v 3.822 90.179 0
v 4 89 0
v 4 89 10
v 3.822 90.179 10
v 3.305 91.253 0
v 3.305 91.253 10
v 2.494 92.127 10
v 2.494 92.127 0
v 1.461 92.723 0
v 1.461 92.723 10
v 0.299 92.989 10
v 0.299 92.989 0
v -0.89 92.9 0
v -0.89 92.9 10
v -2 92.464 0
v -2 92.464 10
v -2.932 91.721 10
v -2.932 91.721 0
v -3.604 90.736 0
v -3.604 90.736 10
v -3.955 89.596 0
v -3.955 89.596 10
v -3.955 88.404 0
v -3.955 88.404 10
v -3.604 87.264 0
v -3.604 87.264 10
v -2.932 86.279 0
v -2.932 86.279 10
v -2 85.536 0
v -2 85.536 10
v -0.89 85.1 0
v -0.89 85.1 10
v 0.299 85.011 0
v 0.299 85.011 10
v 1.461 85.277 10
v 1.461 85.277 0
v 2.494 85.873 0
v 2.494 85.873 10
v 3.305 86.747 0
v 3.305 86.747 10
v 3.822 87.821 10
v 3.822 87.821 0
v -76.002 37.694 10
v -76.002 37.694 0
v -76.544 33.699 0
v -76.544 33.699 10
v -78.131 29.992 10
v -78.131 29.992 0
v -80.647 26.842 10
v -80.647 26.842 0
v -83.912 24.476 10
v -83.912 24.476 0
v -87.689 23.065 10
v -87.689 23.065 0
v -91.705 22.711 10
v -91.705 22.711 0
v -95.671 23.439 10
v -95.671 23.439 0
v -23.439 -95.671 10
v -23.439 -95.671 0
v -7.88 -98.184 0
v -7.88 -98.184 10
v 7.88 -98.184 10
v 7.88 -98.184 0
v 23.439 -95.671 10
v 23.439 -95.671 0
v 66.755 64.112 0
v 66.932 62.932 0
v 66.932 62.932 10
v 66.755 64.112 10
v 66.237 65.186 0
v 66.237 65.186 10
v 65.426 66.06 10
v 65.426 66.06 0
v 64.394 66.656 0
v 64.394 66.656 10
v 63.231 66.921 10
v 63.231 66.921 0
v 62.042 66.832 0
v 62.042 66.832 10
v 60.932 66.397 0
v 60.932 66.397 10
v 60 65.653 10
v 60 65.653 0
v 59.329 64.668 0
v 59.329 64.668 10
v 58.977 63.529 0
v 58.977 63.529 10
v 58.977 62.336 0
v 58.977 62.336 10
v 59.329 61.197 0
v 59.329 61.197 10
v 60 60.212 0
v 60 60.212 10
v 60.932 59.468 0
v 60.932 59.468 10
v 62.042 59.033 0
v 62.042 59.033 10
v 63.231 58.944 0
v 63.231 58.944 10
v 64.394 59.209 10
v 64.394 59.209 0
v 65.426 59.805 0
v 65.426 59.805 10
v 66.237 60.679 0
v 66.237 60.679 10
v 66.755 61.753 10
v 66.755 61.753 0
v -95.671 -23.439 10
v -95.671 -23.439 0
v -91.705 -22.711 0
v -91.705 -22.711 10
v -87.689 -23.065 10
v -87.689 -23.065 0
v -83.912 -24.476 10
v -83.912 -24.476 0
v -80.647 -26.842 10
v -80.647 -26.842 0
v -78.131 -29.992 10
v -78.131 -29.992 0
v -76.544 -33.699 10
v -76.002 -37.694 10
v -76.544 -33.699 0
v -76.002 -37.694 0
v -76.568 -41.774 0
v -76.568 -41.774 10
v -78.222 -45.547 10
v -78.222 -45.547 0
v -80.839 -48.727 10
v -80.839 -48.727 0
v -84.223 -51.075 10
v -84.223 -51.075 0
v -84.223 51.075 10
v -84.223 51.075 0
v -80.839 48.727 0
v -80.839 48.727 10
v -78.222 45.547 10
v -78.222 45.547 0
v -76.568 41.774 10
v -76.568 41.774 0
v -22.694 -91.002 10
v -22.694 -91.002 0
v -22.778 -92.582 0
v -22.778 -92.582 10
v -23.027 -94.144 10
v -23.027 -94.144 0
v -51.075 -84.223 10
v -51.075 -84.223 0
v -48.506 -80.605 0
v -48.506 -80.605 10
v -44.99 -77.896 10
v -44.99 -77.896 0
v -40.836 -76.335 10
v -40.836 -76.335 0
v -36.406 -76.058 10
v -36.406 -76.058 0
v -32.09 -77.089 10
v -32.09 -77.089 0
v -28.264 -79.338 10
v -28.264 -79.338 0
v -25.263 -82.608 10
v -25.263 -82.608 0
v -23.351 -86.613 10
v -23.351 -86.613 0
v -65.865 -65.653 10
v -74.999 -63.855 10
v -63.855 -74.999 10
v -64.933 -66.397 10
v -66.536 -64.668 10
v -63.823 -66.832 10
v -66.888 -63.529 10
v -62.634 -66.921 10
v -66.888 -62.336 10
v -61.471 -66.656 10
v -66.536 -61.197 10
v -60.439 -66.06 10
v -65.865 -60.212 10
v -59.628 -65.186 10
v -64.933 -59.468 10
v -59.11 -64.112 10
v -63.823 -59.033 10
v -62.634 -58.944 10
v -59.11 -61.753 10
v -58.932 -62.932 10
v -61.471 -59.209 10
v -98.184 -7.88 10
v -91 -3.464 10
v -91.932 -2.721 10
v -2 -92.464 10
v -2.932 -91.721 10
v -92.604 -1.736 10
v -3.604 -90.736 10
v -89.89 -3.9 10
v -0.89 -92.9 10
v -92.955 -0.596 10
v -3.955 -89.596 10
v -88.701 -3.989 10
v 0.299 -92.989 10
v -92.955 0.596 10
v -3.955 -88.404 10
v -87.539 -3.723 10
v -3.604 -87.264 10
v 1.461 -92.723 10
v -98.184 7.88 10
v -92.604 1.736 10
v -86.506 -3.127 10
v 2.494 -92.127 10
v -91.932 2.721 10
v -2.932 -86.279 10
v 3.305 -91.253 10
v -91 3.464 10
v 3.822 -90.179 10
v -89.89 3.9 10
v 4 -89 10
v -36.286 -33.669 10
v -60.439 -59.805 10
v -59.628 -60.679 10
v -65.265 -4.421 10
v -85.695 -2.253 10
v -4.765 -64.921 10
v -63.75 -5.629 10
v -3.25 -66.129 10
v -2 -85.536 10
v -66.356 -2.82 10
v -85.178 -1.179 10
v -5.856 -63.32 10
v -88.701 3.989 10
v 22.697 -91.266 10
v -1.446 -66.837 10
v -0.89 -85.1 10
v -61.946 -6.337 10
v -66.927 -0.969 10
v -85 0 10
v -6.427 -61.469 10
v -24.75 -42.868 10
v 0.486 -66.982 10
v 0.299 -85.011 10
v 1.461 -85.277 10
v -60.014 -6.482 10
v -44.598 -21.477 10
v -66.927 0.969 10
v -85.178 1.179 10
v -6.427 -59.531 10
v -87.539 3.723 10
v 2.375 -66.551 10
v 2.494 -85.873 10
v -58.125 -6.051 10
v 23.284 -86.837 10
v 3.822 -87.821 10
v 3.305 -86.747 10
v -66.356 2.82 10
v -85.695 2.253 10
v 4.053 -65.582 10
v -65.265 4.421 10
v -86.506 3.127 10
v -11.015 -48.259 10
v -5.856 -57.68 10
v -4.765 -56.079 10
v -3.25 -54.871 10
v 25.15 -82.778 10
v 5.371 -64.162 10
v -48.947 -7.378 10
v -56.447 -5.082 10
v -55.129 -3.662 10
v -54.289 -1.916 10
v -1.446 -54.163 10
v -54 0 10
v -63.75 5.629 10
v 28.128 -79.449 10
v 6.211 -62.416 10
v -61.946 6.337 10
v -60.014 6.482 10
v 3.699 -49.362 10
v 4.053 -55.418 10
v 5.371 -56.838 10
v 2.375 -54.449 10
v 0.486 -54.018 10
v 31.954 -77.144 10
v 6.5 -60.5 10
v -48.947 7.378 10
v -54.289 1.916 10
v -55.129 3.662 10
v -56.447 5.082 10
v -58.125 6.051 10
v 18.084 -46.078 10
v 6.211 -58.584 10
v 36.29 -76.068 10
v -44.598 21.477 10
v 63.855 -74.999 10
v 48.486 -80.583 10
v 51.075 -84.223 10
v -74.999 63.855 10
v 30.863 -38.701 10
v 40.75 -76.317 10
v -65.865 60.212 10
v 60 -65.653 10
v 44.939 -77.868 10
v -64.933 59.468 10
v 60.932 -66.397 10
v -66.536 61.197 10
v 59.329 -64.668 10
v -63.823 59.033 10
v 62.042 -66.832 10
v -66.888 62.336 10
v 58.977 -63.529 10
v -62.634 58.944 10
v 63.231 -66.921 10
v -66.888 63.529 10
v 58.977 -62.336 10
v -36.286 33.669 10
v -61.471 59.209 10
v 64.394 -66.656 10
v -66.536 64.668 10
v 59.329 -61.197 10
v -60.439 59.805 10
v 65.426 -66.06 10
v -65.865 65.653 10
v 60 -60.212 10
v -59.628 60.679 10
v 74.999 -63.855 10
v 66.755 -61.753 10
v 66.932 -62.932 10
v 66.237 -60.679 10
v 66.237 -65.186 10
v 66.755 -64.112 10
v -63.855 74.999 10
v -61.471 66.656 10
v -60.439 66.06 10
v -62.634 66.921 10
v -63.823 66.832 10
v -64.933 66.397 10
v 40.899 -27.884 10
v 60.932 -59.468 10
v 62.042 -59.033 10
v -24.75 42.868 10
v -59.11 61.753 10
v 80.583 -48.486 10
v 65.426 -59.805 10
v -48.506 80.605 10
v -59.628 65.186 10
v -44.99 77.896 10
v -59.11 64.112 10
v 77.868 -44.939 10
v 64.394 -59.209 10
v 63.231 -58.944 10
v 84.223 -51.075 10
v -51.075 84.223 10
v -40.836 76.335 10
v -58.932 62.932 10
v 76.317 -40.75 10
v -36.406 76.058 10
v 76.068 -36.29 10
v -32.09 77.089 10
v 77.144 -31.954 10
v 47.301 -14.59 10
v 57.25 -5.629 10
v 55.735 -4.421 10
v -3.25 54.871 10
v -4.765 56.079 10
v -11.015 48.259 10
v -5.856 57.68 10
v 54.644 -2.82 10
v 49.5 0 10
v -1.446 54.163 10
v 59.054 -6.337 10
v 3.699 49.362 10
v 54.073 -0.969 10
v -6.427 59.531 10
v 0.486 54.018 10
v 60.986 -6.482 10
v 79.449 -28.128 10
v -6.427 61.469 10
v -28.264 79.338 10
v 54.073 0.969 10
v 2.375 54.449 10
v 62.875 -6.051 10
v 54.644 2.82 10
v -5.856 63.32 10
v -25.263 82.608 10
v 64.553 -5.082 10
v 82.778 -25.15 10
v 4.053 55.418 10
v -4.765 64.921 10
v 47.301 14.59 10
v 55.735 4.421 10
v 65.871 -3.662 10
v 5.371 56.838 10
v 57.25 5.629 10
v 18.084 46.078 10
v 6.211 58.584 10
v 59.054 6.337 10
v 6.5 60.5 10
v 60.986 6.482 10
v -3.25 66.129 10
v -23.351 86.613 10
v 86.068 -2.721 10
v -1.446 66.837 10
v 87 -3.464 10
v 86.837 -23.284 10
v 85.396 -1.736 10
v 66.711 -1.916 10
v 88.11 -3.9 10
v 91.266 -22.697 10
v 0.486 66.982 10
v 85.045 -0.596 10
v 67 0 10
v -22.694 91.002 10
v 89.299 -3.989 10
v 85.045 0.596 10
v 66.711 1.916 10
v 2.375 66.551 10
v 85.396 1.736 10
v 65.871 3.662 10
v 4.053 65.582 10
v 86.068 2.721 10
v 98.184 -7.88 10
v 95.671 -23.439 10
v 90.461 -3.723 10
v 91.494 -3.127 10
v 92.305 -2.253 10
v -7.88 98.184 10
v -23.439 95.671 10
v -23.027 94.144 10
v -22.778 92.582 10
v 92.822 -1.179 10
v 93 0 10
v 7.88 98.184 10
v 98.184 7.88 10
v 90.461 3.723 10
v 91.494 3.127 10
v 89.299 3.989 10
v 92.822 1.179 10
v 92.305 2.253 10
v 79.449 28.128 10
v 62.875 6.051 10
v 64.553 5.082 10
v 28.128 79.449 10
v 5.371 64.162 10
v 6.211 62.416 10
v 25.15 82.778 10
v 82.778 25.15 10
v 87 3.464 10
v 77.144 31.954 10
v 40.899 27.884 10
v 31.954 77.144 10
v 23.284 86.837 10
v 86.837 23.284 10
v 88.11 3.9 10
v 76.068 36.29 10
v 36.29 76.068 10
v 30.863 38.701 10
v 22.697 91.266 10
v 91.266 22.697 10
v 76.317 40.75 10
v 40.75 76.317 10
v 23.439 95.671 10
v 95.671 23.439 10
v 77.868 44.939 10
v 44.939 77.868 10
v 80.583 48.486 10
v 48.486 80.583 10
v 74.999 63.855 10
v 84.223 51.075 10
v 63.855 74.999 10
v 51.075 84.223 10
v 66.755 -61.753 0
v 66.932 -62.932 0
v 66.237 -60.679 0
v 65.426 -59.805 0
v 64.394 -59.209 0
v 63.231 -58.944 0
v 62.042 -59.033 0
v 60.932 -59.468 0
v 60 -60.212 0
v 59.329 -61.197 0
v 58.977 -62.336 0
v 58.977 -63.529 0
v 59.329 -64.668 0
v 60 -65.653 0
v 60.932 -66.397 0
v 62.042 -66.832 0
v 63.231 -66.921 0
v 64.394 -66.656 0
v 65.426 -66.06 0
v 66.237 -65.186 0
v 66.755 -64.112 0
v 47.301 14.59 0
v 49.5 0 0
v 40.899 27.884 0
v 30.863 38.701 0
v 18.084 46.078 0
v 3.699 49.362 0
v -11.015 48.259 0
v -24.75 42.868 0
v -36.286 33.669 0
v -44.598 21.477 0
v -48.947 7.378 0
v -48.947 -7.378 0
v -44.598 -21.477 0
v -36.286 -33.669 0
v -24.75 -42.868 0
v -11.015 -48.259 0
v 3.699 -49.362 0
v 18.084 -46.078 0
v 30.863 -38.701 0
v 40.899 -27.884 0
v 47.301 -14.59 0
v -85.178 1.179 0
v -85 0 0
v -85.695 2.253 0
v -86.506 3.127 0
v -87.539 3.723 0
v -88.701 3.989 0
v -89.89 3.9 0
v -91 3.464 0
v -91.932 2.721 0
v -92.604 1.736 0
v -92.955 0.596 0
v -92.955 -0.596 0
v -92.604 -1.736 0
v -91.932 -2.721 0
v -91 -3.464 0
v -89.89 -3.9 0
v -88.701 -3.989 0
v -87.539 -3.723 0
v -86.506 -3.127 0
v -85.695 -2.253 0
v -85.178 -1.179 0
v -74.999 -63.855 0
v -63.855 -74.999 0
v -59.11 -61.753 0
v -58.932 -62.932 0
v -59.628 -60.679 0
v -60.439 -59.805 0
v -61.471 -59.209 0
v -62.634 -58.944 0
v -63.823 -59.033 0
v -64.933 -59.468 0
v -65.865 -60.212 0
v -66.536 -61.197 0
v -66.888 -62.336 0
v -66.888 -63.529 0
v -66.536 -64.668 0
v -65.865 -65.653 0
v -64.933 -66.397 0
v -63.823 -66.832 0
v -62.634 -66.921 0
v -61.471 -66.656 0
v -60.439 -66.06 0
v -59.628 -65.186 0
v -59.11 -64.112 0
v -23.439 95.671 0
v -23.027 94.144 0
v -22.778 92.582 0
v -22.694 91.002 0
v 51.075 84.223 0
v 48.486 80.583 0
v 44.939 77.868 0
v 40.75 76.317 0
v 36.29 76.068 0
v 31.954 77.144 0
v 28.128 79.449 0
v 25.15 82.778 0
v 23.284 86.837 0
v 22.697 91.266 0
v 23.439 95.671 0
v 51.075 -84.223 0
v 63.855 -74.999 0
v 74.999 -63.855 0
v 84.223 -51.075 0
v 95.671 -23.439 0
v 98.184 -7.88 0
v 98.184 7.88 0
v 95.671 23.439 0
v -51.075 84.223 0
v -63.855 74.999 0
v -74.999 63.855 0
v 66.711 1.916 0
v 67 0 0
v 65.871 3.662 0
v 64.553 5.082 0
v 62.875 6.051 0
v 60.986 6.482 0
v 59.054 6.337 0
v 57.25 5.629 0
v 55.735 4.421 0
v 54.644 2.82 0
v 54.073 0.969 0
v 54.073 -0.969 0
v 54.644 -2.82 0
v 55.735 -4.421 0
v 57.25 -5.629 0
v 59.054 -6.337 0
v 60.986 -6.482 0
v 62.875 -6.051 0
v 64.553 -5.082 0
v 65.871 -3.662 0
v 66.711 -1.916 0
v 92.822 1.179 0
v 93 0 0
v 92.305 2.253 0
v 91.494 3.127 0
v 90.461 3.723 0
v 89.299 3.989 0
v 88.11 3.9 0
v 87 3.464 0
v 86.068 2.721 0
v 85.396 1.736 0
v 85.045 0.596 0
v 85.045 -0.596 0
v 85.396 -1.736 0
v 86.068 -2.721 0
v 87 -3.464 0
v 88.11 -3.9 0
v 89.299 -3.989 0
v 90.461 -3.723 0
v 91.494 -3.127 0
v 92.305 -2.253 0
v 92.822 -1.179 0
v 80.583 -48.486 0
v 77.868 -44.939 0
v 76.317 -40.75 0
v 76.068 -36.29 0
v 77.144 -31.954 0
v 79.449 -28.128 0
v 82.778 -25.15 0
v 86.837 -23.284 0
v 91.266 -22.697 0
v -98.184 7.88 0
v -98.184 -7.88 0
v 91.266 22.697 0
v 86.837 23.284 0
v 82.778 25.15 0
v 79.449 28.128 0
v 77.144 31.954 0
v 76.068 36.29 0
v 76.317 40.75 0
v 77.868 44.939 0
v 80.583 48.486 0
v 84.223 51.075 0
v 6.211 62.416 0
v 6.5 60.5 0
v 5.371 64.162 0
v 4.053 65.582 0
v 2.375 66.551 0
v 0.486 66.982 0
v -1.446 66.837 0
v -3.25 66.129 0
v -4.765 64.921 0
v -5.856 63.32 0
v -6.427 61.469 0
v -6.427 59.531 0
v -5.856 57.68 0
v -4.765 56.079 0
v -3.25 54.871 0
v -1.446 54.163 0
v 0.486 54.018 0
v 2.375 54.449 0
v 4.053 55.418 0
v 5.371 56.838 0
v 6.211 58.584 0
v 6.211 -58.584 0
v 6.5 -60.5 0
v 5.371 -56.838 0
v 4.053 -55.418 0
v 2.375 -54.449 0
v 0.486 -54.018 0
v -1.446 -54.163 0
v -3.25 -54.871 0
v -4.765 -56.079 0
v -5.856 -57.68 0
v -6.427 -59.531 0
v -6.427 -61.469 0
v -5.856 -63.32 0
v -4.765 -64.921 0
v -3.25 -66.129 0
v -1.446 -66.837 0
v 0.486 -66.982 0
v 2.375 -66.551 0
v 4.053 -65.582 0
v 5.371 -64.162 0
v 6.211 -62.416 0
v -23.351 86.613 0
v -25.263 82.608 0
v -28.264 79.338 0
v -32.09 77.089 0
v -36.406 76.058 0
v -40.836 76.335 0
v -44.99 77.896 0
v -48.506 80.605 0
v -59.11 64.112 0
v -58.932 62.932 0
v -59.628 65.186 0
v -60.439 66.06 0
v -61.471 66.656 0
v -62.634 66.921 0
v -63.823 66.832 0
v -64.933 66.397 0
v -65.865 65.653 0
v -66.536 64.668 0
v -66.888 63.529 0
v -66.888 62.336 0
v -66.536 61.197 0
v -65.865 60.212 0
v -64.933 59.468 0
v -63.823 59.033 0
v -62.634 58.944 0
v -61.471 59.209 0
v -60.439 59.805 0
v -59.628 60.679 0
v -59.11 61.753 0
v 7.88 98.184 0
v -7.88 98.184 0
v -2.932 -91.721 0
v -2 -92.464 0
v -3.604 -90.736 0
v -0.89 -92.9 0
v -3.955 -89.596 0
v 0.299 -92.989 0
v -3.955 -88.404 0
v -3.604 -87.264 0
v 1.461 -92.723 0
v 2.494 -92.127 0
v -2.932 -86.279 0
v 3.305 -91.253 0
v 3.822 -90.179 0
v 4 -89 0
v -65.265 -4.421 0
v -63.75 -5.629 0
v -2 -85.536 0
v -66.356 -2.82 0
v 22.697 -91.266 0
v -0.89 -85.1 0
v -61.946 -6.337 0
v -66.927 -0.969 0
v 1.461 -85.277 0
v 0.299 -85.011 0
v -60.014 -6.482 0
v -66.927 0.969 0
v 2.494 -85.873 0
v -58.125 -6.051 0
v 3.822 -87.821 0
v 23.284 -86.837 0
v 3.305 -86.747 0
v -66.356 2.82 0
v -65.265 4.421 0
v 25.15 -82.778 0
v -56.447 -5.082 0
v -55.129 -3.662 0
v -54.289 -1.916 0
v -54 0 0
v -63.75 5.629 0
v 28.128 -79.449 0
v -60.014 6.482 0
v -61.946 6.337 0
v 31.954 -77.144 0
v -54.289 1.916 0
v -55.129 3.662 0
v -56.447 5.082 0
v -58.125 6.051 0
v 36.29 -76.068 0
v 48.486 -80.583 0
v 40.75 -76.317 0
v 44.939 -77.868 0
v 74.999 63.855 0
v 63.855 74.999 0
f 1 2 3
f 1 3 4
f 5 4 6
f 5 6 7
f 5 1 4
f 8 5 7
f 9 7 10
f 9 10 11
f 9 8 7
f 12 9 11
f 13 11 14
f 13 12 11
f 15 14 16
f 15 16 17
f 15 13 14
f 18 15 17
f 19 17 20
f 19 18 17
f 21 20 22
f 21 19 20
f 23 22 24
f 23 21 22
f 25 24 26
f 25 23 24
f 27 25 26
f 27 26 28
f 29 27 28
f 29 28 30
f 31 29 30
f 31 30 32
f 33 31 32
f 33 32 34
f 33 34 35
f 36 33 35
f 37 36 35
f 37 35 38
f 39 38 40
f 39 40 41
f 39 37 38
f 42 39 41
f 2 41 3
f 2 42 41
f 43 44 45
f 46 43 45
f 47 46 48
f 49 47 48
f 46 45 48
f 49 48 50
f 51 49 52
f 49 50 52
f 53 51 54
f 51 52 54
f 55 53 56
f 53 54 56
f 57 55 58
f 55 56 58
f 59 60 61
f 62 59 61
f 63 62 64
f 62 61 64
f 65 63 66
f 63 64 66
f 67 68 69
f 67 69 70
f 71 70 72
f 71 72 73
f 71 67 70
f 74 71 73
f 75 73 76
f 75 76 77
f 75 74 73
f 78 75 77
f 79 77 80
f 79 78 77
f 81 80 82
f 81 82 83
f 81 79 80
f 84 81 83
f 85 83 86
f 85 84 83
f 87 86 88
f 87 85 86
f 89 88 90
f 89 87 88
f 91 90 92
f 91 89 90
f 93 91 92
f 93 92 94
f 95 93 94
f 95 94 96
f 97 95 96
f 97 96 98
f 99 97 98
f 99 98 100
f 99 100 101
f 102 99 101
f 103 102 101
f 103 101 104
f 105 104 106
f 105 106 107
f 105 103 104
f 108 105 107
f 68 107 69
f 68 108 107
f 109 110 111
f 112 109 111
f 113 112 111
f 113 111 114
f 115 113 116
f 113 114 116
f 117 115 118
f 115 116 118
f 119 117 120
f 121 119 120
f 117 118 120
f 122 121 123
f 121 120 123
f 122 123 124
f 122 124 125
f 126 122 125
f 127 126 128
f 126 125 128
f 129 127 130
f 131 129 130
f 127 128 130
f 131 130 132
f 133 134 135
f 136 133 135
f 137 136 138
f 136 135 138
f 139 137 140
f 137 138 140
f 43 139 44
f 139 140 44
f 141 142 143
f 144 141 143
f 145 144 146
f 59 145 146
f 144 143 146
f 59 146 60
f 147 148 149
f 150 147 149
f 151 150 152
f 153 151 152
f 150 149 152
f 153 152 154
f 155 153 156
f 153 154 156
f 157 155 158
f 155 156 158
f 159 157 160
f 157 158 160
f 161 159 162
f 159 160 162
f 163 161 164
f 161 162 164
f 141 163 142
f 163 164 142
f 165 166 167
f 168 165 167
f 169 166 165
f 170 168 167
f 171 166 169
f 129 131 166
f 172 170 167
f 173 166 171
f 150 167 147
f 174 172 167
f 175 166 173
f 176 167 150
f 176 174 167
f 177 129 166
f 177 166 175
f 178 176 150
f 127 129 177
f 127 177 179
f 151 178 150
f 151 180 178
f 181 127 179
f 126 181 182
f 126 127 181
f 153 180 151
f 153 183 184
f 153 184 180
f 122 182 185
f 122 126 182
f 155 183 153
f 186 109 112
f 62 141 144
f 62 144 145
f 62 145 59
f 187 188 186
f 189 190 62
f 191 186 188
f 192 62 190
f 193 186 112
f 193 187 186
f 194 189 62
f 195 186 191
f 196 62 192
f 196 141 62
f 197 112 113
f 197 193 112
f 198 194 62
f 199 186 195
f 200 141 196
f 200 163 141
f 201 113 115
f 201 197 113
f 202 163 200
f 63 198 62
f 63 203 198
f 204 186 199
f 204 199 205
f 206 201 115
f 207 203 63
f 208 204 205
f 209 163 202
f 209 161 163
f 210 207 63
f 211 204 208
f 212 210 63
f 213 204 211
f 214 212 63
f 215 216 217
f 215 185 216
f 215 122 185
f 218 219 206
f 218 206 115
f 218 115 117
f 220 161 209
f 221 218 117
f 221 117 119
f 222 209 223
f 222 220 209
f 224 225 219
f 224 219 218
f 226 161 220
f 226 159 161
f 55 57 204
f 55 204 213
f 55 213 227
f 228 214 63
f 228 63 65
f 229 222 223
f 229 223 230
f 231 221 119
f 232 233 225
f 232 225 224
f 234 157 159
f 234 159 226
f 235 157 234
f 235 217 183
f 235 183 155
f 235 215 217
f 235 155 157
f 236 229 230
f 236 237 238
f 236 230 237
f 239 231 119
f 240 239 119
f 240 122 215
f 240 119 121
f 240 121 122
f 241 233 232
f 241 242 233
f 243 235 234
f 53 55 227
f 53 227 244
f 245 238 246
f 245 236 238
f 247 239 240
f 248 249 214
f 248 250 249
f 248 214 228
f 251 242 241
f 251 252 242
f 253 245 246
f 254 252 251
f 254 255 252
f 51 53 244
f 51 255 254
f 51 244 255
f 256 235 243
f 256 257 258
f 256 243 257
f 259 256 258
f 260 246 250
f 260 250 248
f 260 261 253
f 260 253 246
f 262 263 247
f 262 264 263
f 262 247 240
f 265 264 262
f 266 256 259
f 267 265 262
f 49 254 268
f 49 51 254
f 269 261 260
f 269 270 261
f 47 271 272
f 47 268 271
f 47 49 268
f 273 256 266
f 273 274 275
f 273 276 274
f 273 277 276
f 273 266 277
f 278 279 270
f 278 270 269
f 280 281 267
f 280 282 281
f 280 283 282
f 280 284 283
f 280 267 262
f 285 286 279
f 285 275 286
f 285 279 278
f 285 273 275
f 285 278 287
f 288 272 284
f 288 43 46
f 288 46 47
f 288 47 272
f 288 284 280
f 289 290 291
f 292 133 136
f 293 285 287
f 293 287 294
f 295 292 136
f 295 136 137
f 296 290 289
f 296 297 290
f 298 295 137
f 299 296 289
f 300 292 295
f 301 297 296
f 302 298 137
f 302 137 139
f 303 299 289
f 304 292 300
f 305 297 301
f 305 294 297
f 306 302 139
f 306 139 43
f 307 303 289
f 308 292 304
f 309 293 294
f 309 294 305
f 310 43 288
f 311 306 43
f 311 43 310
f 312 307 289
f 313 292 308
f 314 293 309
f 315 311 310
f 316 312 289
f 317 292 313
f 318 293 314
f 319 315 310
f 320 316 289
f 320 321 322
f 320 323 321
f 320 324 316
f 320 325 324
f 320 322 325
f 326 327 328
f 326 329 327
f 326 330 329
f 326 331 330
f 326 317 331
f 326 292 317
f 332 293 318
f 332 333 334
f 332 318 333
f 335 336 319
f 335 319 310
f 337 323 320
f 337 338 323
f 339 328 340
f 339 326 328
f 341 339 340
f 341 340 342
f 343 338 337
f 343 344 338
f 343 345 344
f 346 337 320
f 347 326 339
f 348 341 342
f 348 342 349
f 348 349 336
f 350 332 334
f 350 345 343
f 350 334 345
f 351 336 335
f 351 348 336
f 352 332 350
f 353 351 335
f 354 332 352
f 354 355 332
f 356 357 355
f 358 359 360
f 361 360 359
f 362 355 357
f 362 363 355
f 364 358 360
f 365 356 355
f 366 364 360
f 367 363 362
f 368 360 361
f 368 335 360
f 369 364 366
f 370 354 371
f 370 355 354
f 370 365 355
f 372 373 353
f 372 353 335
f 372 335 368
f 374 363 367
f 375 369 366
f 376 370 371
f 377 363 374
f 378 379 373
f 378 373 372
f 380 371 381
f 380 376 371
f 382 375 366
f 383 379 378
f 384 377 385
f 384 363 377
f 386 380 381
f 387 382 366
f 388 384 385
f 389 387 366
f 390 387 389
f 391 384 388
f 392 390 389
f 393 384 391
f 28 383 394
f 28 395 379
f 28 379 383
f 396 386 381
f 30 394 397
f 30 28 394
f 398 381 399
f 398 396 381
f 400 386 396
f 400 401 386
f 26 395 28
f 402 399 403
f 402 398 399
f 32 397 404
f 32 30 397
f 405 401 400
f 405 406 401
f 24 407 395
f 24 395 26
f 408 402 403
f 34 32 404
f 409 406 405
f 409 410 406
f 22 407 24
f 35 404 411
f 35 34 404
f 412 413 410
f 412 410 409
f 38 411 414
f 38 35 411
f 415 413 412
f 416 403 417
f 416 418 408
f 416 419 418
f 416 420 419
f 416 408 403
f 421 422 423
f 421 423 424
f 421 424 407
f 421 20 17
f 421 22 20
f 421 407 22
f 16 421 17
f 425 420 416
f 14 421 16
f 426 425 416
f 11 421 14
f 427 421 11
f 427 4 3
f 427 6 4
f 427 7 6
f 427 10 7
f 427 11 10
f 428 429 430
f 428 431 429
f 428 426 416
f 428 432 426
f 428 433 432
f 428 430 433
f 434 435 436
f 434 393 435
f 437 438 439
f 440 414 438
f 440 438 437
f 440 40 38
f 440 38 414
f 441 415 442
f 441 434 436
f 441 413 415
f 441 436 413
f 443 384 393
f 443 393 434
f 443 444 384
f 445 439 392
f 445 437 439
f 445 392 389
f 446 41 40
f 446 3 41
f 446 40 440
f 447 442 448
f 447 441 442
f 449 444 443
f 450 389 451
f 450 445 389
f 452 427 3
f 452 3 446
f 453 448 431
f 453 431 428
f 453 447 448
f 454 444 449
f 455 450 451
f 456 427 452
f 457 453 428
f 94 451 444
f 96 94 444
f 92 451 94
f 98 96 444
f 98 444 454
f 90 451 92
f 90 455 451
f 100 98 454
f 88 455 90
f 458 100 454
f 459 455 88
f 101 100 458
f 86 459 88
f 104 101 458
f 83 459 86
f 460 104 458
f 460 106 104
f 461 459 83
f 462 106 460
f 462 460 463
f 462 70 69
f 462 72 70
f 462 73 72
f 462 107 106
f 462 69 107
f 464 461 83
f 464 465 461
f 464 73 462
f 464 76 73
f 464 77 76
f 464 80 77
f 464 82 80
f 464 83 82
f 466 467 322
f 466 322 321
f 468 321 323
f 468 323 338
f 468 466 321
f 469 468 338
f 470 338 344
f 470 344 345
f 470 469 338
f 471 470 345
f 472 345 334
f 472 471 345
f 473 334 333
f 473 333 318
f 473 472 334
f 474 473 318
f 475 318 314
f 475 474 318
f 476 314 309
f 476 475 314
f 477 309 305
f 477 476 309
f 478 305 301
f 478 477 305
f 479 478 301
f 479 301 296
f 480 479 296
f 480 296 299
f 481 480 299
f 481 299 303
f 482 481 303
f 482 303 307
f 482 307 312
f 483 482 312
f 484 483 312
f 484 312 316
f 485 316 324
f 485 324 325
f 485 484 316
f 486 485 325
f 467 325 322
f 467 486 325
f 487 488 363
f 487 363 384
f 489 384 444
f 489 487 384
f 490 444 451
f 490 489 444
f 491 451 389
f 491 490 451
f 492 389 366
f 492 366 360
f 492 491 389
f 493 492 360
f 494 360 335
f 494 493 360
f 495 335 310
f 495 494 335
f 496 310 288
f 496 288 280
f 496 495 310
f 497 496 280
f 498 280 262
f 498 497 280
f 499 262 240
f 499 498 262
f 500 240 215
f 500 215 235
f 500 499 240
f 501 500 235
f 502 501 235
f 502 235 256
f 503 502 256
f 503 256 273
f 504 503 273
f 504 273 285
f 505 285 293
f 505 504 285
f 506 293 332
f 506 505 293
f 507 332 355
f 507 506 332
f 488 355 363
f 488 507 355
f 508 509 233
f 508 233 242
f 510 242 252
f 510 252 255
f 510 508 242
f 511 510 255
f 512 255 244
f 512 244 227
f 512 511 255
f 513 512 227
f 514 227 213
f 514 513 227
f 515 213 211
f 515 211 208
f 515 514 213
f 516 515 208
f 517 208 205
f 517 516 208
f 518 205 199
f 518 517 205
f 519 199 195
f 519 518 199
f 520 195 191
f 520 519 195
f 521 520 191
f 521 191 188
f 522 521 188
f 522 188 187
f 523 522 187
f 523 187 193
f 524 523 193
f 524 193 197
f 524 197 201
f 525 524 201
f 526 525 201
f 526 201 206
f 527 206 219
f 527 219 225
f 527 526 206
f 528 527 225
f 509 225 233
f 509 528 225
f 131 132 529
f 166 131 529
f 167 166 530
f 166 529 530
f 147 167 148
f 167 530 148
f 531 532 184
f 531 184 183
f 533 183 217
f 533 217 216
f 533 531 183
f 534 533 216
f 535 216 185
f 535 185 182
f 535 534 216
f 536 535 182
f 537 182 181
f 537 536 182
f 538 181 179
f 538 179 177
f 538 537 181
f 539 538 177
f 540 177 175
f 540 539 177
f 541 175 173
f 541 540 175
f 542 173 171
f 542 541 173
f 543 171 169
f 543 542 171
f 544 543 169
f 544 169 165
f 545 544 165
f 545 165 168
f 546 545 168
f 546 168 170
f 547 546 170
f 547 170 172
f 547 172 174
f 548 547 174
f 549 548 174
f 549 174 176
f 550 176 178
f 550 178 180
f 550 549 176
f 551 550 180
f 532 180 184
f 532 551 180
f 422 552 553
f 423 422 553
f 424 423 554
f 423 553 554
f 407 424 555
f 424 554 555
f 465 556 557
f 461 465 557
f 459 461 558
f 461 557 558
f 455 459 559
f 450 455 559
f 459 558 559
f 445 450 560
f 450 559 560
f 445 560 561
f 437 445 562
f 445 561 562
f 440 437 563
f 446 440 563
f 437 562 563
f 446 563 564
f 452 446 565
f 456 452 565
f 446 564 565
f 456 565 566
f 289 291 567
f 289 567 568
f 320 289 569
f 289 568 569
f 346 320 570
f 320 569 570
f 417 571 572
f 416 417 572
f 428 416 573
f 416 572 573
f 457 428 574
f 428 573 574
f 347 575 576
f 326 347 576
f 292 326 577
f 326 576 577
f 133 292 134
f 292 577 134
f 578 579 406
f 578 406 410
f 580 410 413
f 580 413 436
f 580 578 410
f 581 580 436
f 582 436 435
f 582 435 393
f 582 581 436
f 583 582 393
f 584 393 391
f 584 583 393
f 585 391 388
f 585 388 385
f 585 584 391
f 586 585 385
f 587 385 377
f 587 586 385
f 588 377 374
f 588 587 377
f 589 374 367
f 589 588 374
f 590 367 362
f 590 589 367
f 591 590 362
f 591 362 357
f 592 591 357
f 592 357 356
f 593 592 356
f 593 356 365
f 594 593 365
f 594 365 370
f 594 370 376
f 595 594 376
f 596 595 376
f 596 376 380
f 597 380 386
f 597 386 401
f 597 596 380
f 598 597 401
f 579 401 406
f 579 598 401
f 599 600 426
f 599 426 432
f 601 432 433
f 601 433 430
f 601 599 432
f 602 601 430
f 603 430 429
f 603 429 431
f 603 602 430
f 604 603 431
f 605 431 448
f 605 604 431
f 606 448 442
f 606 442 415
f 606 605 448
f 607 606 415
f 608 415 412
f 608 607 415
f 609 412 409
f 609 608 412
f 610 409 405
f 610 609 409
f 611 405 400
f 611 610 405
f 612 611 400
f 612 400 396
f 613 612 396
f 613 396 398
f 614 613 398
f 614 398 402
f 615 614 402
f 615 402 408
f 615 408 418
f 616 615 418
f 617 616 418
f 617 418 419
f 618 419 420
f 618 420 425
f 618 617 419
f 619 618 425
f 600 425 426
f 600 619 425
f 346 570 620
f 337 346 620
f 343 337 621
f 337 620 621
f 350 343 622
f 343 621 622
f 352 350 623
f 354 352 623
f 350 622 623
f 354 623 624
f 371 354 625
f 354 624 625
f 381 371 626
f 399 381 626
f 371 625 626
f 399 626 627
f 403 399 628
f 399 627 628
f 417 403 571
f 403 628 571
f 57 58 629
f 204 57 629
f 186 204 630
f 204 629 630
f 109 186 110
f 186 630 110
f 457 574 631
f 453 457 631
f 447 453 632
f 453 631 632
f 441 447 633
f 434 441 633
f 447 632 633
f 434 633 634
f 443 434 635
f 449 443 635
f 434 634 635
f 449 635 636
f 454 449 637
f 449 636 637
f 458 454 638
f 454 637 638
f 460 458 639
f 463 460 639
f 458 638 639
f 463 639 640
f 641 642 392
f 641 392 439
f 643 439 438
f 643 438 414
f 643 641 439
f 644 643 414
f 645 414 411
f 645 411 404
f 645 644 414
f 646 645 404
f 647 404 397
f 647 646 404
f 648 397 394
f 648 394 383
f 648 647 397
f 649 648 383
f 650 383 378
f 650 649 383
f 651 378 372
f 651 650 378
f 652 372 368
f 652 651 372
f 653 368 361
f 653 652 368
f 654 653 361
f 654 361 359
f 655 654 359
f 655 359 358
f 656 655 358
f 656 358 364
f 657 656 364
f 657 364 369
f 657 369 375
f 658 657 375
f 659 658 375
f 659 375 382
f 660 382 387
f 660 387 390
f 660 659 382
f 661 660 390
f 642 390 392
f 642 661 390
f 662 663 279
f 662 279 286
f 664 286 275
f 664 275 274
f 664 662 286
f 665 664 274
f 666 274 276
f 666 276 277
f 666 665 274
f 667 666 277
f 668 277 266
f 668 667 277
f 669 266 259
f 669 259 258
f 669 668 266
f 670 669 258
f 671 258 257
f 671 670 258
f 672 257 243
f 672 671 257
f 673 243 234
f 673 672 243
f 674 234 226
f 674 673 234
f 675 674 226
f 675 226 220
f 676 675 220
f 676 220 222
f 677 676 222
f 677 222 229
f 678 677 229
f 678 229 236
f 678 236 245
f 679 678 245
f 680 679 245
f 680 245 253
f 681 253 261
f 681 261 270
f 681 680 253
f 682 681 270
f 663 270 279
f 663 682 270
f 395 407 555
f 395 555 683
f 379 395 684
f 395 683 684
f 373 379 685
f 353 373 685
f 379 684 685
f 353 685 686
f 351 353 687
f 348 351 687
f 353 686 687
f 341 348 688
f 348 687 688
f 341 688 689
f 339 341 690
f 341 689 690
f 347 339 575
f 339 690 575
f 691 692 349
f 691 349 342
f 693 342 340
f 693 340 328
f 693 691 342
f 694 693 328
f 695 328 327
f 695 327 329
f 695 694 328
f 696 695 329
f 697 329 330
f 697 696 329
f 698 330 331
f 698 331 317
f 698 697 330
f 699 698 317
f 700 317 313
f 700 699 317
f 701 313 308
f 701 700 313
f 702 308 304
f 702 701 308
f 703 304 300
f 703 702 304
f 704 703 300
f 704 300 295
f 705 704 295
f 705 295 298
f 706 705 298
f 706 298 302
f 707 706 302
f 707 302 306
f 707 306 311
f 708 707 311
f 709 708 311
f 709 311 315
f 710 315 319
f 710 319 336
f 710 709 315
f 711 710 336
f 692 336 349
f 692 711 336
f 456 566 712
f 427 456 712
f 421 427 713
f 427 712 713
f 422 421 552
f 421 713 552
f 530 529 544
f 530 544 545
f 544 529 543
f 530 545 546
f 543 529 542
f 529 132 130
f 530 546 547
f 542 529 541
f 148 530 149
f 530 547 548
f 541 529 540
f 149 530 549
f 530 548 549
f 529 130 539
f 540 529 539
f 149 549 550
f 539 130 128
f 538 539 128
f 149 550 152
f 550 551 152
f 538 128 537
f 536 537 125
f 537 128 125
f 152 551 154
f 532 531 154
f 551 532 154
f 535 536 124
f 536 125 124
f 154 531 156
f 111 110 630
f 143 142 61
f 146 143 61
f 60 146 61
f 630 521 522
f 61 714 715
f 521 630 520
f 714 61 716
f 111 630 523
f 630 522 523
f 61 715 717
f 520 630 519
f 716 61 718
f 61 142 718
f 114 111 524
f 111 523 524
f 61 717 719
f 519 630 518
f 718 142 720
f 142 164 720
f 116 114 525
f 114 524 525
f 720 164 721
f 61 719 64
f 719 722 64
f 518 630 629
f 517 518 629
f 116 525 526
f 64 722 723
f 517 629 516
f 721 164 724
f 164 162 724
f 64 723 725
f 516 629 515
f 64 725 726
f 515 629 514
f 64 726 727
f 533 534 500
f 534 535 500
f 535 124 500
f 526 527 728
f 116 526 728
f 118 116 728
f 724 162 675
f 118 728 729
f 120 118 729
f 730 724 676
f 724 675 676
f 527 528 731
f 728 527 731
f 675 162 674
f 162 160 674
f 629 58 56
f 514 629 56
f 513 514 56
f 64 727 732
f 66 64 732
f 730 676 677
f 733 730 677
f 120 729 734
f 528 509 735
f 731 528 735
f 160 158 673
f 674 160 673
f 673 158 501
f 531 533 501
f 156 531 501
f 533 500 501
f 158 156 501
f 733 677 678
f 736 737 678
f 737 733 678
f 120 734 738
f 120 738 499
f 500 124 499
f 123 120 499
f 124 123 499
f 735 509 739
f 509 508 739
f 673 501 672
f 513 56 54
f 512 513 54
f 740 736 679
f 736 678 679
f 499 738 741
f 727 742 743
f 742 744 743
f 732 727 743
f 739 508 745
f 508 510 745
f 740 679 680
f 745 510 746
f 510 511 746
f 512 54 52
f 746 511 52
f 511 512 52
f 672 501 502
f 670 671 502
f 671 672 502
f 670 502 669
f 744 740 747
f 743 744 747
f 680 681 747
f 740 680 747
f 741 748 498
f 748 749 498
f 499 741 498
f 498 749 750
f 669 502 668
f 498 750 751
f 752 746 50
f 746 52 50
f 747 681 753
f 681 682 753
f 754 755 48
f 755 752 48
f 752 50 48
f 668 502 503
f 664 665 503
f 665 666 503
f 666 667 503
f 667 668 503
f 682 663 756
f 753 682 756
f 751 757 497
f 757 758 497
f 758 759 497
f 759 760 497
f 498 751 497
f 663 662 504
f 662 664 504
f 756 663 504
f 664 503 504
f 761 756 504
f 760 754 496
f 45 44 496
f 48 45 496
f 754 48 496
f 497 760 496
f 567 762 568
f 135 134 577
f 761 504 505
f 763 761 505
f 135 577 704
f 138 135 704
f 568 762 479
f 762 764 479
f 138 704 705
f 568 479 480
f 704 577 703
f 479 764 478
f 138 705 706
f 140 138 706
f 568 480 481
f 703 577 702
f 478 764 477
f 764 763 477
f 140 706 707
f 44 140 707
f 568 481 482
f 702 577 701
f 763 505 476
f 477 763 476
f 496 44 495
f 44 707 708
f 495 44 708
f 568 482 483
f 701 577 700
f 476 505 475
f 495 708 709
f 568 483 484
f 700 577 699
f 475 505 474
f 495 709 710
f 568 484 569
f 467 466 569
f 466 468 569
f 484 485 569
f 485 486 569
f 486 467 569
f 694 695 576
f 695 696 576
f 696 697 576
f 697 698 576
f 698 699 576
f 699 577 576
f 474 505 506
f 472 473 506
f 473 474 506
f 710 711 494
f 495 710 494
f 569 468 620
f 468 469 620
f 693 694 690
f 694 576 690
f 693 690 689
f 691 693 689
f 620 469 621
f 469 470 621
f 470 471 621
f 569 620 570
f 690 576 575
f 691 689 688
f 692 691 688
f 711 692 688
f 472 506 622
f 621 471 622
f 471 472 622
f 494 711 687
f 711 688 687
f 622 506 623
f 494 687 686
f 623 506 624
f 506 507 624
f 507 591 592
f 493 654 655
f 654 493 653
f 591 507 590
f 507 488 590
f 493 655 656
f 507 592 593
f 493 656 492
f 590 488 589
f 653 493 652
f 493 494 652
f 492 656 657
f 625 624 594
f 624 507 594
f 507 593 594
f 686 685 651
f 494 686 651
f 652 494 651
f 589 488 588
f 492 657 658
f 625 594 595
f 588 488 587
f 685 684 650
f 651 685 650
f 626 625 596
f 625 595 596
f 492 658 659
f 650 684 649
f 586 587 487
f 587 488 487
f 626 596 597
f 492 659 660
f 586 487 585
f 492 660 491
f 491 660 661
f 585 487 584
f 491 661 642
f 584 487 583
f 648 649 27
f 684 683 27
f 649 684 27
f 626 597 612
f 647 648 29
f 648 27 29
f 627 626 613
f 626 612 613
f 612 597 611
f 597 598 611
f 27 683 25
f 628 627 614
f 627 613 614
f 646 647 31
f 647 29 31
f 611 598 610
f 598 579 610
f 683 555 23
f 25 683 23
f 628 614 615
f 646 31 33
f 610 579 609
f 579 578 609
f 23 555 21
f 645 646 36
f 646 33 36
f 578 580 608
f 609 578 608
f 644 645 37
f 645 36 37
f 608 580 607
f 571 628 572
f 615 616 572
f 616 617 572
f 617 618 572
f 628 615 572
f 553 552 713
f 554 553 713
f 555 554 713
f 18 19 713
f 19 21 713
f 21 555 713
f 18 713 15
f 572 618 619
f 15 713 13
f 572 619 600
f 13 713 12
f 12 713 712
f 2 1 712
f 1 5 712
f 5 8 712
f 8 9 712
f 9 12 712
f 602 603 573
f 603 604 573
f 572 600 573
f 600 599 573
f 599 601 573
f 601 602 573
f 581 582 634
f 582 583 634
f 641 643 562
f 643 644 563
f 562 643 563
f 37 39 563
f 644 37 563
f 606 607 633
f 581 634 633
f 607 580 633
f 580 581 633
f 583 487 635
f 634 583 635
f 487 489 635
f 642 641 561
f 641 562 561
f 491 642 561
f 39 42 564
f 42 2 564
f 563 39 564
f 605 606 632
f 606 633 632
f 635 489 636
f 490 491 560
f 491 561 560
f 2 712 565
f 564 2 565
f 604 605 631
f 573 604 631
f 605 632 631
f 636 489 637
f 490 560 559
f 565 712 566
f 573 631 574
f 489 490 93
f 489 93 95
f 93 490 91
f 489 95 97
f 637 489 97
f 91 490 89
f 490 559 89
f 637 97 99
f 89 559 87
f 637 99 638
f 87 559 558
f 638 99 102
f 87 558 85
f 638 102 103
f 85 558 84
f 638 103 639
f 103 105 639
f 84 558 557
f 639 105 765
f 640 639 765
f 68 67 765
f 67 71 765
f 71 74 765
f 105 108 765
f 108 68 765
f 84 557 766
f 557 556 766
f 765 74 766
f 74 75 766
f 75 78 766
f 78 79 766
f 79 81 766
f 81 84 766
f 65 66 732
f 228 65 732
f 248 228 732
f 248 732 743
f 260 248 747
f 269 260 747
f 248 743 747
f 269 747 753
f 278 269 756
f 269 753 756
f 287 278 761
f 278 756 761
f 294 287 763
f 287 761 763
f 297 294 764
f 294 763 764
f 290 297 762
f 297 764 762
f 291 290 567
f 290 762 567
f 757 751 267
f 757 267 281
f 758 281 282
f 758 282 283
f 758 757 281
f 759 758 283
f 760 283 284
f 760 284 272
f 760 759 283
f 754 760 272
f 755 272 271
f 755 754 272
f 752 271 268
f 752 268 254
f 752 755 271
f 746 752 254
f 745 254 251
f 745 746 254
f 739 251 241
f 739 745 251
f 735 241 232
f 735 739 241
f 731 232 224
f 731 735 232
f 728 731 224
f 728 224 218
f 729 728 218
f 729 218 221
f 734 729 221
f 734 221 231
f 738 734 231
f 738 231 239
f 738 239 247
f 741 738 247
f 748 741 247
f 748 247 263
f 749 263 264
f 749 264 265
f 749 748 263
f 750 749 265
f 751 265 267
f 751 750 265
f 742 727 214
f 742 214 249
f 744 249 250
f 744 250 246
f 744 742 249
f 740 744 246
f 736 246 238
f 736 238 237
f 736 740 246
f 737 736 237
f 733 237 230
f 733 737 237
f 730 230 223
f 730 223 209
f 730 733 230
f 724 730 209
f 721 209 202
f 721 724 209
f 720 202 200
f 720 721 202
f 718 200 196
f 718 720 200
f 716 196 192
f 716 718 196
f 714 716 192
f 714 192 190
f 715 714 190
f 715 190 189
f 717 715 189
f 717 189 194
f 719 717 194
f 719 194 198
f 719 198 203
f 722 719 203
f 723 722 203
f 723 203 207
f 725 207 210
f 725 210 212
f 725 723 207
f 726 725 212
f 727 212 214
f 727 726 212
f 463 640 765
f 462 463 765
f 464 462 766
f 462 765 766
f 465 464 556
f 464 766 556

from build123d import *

# Parameters (mm, degrees)
F0_R     = 4
F0_R_2   = 6.5
F0_R_3   = 49.5
F1_DEPTH = 10


# Not quite as in the source:
# - ends of sketch curves that miss each other by under 0.0002 mm in the source are joined


with BuildPart() as f1:
    # F0 (on Top) → F1 (new body)
    with BuildSketch(Plane.XY):
        with BuildLine():
            ThreePointArc((95.6705294551, -23.4392788665), (97.790074014, -11.804720426), (98.5, 0))
            ThreePointArc((98.5, 0), (97.790074014, 11.804720426), (95.6705294551, 23.4392788665))
            ThreePointArc((95.6705294551, 23.4392788665), (77.143947059, 31.9540684018), (84.2233479596, 51.0752010798))
            ThreePointArc((84.2233479596, 51.0752010798), (69.6500179469, 69.6500179469), (51.0752071036, 84.2233531708))
            ThreePointArc((51.0752071036, 84.2233531708), (31.9540684018, 77.143947059), (23.4392785061, 95.6705221617))
            ThreePointArc((23.4392785061, 95.6705221617), (0, 98.5), (-23.4392788665, 95.6705294551))
            ThreePointArc((-23.4392788665, 95.6705294551), (-22.8817314531, 93.3658702171), (-22.69432, 91.00214))
            ThreePointArc((-22.69432, 91.00214), (-34.2095830083, 76.4125338333), (-51.0752010798, 84.2233479596))
            ThreePointArc((-51.0752010798, 84.2233479596), (-69.6500179469, 69.6500179469), (-84.2233531708, 51.0752071036))
            ThreePointArc((-84.2233531708, 51.0752071036), (-78.2216528988, 45.5466540133), (-76.00214, 37.69432))
            ThreePointArc((-76.00214, 37.69432), (-82.1994623513, 25.5488325165), (-95.6705221617, 23.4392785061))
            ThreePointArc((-95.6705221617, 23.4392785061), (-98.5, 0), (-95.6705294551, -23.4392788665))
            ThreePointArc((-95.6705294551, -23.4392788665), (-82.1994623513, -25.5488325165), (-76.00214, -37.69432))
            ThreePointArc((-76.00214, -37.69432), (-78.2216493872, -45.5466482978), (-84.2233479596, -51.0752010798))
            ThreePointArc((-84.2233479596, -51.0752010798), (-69.6500179469, -69.6500179469), (-51.0752071036, -84.2233531708))
            ThreePointArc((-51.0752071036, -84.2233531708), (-34.2095830083, -76.4125338333), (-22.69432, -91.00214))
            ThreePointArc((-22.69432, -91.00214), (-22.8817303816, -93.3658635024), (-23.4392785061, -95.6705221617))
            ThreePointArc((-23.4392785061, -95.6705221617), (0, -98.5), (23.4392788665, -95.6705294551))
            ThreePointArc((23.4392788665, -95.6705294551), (31.9540745992, -77.143944492), (51.0752071429, -84.2233599276))
            ThreePointArc((51.0752071429, -84.2233599276), (69.6500179469, -69.6500179469), (84.2233531708, -51.0752071036))
            ThreePointArc((84.2233531708, -51.0752071036), (77.1439496611, -31.9540621197), (95.6705294551, -23.4392788665))
        make_face()
        with Locations((-62.9325, -62.9325)):
            Circle(F0_R, mode=Mode.SUBTRACT)
        with Locations((0, -89)):
            Circle(F0_R, mode=Mode.SUBTRACT)
        with Locations((0, -60.5)):
            Circle(F0_R_2, mode=Mode.SUBTRACT)
        with Locations((-89, 0)):
            Circle(F0_R, mode=Mode.SUBTRACT)
        with Locations((-60.5, 0)):
            Circle(F0_R_2, mode=Mode.SUBTRACT)
        Circle(F0_R_3, mode=Mode.SUBTRACT)
        with Locations((62.9325, -62.9325)):
            Circle(F0_R, mode=Mode.SUBTRACT)
        with Locations((60.5, 0)):
            Circle(F0_R_2, mode=Mode.SUBTRACT)
        with Locations((89, 0)):
            Circle(F0_R, mode=Mode.SUBTRACT)
        with Locations((-62.9325, 62.9325)):
            Circle(F0_R, mode=Mode.SUBTRACT)
        with Locations((0, 60.5)):
            Circle(F0_R_2, mode=Mode.SUBTRACT)
        with Locations((0, 89)):
            Circle(F0_R, mode=Mode.SUBTRACT)
        with Locations((62.9325, 62.9325)):
            Circle(F0_R, mode=Mode.SUBTRACT)
    extrude(amount=F1_DEPTH)


solid = f1.part
